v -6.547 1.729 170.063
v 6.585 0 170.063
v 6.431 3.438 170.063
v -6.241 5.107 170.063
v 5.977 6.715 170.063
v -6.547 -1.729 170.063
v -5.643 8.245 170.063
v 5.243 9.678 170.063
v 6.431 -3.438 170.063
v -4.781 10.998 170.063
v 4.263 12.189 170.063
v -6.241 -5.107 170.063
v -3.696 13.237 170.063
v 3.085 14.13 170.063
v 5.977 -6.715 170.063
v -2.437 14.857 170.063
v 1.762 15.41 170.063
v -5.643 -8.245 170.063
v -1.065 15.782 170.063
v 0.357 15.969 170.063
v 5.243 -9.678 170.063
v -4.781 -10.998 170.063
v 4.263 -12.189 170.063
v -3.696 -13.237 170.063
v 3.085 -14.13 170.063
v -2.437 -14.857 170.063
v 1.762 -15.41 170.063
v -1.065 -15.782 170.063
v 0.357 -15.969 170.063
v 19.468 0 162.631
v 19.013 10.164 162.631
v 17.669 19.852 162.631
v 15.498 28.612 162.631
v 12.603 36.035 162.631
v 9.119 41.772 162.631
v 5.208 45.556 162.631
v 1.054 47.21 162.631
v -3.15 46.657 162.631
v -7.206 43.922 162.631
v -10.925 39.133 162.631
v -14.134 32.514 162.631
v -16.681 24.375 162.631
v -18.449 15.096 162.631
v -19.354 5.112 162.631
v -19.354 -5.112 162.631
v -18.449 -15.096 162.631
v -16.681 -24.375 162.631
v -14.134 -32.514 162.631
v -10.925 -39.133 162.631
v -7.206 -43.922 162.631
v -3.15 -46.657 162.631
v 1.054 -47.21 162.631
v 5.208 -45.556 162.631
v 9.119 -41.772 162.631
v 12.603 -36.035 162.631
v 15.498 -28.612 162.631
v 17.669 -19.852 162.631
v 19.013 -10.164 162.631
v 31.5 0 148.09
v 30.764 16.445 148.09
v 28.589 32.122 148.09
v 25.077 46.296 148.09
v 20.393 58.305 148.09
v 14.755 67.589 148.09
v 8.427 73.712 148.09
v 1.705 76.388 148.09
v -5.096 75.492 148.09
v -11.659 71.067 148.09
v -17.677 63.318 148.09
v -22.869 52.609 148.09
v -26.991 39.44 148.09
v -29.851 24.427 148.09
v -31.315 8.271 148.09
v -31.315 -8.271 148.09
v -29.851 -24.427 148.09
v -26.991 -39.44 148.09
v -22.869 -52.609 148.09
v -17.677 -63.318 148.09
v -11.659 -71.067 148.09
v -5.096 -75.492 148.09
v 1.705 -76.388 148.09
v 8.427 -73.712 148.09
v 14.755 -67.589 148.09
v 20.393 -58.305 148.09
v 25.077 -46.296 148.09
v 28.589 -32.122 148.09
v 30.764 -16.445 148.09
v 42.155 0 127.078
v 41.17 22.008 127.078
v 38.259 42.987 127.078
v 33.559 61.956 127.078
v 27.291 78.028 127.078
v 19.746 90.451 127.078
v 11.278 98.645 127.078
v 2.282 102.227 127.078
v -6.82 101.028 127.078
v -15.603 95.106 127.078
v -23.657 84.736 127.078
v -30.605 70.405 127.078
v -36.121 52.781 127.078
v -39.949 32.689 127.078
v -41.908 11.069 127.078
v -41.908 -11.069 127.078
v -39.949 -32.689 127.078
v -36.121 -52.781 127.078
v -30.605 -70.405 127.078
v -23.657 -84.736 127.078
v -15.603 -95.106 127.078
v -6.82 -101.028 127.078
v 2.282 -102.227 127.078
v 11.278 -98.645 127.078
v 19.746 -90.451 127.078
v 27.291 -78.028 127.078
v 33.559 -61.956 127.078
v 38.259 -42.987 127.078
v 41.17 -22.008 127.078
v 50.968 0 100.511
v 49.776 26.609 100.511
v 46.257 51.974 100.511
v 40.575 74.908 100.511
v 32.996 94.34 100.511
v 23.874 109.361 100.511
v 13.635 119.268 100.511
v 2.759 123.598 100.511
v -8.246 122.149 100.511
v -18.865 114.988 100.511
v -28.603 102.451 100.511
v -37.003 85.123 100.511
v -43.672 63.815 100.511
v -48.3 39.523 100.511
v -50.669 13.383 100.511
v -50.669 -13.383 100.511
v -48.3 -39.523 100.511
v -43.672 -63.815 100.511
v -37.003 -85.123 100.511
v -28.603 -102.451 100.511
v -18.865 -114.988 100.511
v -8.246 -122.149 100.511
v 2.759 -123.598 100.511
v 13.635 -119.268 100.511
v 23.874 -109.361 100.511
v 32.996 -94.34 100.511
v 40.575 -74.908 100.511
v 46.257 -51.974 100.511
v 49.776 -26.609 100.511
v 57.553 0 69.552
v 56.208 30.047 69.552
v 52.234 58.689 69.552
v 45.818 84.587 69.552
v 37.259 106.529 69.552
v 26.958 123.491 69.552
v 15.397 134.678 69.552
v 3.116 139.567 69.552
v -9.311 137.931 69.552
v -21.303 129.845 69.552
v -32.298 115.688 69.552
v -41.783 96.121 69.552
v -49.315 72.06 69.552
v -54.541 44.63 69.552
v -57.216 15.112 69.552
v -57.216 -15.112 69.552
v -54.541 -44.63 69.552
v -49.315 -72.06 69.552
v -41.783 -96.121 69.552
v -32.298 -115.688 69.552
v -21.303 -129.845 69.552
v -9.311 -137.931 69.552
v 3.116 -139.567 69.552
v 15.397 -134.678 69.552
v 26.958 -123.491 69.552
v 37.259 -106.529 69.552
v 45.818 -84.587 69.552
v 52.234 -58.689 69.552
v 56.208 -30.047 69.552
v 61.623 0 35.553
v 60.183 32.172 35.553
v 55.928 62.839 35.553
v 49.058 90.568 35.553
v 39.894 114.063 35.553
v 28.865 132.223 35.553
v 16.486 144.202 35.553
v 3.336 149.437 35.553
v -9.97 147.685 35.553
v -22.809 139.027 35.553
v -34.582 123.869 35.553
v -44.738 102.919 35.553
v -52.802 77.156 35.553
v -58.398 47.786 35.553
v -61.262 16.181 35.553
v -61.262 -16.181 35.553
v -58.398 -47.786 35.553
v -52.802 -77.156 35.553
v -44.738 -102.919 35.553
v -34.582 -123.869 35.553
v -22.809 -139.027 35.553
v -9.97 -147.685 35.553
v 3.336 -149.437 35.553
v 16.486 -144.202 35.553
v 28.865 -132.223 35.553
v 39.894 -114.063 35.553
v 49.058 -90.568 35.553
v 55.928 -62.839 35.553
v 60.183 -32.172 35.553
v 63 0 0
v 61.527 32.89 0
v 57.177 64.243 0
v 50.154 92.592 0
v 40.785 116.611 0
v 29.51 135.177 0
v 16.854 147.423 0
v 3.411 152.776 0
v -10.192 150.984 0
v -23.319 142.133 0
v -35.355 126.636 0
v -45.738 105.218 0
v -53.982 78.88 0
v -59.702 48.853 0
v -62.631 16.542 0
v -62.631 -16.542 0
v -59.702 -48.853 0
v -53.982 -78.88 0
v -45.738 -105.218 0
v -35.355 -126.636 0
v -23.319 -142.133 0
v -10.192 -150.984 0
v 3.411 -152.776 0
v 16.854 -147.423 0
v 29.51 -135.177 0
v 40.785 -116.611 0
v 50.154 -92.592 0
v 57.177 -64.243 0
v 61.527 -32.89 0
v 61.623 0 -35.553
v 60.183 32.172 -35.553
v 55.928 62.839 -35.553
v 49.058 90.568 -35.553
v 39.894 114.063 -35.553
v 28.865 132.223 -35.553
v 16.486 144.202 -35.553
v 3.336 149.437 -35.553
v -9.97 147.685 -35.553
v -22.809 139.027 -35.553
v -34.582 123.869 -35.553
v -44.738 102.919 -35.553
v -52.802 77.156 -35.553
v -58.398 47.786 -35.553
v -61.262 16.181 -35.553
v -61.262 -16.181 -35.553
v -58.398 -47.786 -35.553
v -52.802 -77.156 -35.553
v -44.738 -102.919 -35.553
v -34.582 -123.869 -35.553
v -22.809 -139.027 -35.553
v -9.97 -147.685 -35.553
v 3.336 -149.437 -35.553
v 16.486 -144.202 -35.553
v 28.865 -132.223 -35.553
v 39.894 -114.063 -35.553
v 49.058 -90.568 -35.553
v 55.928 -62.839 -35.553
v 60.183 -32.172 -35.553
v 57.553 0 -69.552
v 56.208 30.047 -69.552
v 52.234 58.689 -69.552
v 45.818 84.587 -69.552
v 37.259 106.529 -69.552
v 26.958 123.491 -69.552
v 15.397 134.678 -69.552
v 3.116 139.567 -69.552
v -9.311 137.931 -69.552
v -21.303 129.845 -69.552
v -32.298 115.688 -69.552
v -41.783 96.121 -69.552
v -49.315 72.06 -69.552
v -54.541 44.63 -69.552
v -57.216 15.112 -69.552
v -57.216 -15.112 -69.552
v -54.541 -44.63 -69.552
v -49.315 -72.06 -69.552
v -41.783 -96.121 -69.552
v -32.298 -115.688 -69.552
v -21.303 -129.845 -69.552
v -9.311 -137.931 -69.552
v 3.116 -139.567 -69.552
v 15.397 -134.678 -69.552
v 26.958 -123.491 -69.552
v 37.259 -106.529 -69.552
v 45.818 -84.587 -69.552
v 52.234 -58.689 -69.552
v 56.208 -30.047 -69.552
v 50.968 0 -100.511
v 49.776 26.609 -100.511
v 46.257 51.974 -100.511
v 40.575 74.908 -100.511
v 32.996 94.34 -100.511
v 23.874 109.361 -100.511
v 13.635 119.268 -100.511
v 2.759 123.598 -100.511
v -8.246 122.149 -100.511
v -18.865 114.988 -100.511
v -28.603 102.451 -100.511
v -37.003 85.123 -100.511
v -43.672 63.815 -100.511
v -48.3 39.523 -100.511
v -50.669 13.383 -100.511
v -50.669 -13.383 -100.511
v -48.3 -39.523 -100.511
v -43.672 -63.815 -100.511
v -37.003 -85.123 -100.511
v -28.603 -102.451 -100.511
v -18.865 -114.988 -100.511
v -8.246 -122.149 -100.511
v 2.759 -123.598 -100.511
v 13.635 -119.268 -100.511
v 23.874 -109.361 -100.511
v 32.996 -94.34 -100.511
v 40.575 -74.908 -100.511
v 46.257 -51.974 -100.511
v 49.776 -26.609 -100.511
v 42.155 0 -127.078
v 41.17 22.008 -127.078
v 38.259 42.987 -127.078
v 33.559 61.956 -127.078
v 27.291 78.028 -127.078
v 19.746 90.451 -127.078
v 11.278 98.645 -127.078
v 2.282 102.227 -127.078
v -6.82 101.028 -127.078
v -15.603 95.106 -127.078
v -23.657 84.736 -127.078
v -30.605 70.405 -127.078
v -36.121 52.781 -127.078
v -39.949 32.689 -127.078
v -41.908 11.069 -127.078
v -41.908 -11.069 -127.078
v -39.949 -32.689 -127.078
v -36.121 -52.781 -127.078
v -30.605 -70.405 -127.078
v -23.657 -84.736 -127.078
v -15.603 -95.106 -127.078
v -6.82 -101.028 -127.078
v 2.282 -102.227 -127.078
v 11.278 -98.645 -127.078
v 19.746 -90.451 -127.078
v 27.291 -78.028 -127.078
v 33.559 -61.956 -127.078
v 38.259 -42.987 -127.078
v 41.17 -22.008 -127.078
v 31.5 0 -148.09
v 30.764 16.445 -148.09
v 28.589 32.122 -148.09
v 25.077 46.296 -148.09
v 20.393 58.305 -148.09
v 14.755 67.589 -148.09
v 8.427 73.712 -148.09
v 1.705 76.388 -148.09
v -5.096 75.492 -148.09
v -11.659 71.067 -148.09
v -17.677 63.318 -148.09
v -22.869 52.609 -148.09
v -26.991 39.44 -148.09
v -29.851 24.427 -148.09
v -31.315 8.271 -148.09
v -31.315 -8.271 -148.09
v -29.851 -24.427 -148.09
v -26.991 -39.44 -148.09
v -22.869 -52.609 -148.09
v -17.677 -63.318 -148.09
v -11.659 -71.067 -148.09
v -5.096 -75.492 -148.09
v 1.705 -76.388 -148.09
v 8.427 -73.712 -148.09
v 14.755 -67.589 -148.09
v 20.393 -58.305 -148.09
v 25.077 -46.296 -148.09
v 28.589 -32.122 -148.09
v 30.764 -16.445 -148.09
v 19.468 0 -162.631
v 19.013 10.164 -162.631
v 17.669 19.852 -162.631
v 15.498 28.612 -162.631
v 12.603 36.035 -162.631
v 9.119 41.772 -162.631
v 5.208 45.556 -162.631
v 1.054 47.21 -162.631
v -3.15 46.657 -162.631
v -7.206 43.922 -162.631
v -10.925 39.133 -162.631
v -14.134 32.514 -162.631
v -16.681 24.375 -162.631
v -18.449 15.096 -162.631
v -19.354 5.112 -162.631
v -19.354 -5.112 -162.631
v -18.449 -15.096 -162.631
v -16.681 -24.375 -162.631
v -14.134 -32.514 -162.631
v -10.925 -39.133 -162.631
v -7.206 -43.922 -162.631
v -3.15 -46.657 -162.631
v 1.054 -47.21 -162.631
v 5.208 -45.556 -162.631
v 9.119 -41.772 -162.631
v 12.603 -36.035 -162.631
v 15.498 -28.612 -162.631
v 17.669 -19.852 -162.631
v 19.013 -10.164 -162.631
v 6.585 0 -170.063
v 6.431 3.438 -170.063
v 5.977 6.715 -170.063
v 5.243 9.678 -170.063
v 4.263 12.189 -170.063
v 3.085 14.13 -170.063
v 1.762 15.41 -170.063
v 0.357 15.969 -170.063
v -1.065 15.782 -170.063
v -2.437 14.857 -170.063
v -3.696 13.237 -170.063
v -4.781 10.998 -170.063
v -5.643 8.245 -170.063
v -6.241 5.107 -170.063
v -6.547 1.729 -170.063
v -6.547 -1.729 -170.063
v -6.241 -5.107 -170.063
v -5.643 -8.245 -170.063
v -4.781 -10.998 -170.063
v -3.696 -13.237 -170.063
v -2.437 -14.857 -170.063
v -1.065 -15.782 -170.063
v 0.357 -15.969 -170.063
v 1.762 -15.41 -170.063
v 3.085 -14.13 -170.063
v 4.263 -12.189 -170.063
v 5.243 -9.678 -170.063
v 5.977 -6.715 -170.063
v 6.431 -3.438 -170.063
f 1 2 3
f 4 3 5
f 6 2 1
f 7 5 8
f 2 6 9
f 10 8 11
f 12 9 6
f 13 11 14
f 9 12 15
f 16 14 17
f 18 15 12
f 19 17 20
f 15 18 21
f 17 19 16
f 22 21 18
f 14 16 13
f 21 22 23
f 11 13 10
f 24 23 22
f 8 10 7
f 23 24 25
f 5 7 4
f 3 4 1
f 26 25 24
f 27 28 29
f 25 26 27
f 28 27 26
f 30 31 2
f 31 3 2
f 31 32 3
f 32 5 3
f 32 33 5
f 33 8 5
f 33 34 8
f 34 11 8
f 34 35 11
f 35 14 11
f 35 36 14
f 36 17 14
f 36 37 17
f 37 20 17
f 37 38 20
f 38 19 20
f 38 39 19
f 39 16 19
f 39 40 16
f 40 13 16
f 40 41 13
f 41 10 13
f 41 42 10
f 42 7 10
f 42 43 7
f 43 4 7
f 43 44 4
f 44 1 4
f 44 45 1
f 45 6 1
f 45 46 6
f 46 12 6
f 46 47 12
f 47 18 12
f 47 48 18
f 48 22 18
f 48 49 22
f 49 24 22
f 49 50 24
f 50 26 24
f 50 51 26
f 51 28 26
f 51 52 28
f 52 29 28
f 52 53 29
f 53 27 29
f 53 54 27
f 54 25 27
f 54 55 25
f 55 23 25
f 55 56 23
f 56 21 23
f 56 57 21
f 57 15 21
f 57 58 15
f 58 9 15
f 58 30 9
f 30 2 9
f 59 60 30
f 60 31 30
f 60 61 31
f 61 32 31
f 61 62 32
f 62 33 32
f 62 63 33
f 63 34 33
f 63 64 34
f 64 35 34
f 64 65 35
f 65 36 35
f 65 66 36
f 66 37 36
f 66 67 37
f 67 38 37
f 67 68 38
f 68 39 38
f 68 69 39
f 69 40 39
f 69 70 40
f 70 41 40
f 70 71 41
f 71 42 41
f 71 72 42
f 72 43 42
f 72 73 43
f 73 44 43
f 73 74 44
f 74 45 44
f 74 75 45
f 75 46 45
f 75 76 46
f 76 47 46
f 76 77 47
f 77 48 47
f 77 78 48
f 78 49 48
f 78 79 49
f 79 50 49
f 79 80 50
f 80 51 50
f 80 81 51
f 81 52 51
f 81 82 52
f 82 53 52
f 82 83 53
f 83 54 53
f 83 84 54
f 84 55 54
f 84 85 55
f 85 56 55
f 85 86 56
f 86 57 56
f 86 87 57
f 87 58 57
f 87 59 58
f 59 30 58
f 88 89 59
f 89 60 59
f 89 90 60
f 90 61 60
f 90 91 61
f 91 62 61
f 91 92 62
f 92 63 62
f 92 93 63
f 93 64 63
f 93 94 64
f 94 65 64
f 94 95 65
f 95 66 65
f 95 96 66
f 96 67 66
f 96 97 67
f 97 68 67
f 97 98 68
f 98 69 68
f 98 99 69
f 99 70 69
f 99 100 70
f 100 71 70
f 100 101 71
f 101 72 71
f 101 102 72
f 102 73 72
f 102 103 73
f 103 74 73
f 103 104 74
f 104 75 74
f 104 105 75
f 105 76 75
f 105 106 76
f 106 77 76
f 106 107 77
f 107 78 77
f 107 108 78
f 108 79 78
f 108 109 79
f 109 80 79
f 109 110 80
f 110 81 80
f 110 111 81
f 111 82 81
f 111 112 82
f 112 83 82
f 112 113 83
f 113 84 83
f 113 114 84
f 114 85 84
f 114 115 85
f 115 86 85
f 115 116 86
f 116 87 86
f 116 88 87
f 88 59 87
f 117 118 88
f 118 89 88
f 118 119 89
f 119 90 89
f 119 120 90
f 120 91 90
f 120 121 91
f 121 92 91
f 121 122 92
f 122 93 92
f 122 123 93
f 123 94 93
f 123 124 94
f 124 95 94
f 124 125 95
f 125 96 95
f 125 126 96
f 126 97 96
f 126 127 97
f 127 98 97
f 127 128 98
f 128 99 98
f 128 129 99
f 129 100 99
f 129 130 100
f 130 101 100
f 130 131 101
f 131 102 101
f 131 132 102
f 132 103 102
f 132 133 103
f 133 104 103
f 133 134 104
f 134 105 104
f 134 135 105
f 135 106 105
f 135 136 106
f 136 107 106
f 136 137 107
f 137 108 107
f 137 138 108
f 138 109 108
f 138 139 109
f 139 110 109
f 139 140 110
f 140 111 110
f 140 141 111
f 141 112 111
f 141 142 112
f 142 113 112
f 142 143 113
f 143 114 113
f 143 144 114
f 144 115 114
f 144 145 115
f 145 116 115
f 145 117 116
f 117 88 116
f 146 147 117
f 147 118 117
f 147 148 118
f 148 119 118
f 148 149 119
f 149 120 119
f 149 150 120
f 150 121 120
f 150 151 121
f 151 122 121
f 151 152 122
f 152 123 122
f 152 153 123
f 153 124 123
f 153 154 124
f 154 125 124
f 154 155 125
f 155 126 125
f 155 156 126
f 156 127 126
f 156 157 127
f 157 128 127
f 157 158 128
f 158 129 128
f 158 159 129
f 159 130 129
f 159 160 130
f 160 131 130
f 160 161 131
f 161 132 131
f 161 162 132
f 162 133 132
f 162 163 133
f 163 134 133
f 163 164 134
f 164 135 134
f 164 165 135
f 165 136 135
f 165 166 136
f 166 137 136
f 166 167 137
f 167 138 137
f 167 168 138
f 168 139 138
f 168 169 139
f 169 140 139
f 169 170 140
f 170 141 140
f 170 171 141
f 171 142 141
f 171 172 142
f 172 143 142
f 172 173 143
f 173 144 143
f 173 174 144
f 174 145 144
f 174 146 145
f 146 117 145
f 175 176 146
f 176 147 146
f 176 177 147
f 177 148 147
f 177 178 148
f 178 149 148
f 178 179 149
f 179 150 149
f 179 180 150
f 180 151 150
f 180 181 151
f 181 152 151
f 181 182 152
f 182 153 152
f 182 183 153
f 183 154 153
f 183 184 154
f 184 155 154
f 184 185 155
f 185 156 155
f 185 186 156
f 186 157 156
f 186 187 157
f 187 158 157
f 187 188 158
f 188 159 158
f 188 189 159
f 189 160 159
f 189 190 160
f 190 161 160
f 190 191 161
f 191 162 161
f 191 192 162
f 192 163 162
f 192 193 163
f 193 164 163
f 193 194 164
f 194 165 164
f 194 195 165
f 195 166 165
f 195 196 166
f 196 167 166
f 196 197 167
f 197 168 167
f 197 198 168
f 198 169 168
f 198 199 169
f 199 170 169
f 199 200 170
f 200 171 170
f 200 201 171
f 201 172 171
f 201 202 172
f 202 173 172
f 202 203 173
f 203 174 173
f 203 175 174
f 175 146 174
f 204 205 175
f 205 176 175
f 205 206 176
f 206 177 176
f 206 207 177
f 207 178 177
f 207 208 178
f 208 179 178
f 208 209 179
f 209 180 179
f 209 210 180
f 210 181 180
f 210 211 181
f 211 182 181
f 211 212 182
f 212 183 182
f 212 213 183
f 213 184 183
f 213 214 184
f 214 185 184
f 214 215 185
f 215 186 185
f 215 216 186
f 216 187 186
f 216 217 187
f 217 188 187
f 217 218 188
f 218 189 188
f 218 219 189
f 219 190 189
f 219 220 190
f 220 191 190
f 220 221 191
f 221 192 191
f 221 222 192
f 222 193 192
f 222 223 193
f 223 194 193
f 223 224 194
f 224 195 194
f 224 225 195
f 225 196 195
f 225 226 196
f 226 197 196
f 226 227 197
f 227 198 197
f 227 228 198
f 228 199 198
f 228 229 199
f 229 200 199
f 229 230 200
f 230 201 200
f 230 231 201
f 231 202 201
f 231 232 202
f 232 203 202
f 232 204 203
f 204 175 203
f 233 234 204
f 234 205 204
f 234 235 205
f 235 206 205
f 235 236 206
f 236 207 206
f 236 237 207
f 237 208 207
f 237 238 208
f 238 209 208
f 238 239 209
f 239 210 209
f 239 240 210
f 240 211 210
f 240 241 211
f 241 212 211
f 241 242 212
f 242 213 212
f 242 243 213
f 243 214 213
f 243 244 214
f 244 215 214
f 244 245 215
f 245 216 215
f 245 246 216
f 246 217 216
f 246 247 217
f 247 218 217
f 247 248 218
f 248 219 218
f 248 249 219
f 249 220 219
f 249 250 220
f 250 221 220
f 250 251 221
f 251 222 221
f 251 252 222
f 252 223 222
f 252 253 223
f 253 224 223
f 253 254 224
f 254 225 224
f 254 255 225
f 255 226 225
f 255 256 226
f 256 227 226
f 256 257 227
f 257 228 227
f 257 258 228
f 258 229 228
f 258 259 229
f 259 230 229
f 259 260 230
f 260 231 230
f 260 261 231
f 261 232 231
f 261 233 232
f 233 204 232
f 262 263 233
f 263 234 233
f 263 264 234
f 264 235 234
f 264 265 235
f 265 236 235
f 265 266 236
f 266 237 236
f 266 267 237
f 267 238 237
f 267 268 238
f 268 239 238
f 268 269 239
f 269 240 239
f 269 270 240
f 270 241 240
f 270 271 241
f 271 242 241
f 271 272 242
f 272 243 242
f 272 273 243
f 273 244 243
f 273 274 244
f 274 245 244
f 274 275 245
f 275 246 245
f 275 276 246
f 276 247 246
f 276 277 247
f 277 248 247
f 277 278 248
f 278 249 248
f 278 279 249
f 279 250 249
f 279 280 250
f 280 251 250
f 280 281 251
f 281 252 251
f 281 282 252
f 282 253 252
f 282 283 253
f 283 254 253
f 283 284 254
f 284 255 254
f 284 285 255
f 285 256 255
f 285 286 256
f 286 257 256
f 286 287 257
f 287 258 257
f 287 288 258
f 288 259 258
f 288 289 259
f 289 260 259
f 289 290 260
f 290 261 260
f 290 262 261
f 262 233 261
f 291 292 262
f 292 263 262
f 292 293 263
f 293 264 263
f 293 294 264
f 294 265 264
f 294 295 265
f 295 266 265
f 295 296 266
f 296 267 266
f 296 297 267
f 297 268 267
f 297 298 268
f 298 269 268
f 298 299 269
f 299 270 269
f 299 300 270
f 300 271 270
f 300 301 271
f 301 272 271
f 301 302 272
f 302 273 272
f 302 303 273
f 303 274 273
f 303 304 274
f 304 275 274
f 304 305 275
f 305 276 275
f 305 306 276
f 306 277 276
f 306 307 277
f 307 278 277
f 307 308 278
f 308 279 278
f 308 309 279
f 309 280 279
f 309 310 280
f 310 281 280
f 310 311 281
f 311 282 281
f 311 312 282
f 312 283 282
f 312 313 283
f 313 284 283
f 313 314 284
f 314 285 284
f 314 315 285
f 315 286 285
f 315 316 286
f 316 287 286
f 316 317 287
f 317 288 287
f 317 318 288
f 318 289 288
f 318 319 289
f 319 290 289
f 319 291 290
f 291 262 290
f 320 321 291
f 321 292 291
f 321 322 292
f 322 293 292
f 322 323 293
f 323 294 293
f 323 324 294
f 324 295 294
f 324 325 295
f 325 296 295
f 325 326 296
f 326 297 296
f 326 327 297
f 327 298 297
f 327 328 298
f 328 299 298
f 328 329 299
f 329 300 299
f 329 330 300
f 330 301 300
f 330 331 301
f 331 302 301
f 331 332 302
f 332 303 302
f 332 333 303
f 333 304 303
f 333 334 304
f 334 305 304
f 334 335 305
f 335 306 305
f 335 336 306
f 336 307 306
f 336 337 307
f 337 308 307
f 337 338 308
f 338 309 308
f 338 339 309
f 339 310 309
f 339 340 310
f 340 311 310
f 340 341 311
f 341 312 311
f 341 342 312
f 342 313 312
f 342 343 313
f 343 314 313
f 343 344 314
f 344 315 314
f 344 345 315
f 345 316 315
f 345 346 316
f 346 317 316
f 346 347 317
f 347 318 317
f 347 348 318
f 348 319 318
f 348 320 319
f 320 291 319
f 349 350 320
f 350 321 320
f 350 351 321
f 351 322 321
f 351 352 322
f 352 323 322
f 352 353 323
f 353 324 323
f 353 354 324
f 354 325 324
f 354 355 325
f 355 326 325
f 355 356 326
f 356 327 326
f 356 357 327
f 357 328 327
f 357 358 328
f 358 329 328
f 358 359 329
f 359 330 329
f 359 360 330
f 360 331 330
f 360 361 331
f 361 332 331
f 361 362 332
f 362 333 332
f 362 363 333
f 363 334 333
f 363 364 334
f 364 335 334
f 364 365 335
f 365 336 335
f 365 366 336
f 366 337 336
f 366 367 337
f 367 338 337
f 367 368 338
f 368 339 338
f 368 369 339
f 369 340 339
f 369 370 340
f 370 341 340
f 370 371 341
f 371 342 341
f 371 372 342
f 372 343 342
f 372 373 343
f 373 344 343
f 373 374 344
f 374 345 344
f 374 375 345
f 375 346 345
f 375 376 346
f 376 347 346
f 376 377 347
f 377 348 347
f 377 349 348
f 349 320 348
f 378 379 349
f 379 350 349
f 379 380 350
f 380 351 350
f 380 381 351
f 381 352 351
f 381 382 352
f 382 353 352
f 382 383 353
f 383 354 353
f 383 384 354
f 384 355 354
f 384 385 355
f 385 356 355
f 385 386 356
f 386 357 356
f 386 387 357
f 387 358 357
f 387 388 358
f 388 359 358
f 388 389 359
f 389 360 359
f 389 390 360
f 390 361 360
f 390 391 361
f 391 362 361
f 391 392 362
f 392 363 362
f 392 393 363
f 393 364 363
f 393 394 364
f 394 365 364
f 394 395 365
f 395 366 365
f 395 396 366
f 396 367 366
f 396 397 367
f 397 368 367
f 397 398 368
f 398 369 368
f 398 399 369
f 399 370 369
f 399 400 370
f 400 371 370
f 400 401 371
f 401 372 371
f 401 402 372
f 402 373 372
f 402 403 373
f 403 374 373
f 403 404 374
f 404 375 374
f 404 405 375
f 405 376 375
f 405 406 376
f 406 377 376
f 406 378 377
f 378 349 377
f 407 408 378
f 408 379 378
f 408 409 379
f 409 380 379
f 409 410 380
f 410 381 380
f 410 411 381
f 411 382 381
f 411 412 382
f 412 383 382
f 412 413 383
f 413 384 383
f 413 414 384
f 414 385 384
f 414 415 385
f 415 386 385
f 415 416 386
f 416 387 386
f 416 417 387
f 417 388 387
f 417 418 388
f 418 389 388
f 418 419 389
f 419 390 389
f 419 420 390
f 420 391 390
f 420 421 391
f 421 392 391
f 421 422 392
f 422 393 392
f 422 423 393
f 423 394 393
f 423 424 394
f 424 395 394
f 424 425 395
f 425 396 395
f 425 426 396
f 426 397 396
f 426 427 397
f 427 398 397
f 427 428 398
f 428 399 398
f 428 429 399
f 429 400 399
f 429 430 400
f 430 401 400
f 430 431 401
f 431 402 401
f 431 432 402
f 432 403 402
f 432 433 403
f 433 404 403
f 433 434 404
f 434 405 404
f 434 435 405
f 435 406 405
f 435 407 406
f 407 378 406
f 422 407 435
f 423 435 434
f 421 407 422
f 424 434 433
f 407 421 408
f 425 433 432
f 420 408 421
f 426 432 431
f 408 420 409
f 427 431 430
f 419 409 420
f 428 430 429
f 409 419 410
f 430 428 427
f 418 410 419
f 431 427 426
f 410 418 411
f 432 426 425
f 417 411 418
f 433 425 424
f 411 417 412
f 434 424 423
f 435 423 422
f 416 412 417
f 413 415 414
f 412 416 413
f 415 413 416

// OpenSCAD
// Generated by SolidPython 1.0.1 on 2020-07-29 00:46:48


scale(v = [7, 17, 19]) {
	sphere(r = 9);
}
/***********************************************
*********      SolidPython code:      **********
************************************************
 
# import packages: SolidPython
from solid import *
from solid.utils import *
from itertools import chain, combinations, permutations


class Resize:

    def __init__(self, scad_file):
        self.scad_file = scad_file
        #self.scad_file = import_scad(scad_file)
        # cone/cylinder param:
        self.r1 = 0
        self.r2 = 0
        self.h = 0
        # rectangular prism param:
        self.w = 0
        self.l = 0
        # ellipse param:
        self.r = 0

    # import OpenScad code (file name corresponds to shape)


    # classify shape + parameters
    def assign(self, param1, param2, param3):
        if self.scad_file == 'cone.scad':
            self.r1 = param1
            self.r2 = param2
            self.h = param3
        elif self.scad_file == 'cylinder.scad':
            self.r1 = param1
            self.r2 = param2
            self.h = param3
        elif self.scad_file == 'rectangularPrism.scad':
            self.h = param1
            self.l = param2
            self.w = param3
        else:
            self.r = param1
            self.h = param2

    # resize parameters
    def iterate(self):
        x = range(3, 20, 2)
        i = 1
        if self.scad_file == 'cone.scad':
            tempList = list(permutations(x, 2))
            for temp in tempList:
                param1 = temp[0]
                param2 = temp[1]
                filepath = 'produced_scad_files/' + 'cone' + str(param1) + '_' + str(param2) + '_' + '.scad'
                scad_render_to_file(cylinder(h=param1, r1=param2, r2=0), filepath)

        elif self.scad_file == 'cylinder.scad':
            tempList = list(permutations(x, 3))
            for temp in tempList:
                param1 = temp[0]
                param2 = temp[1]
                filepath = 'produced_scad_files/' + 'cylinder' + str(param1) + '_' + str(param2) + '_' + '.scad'
                scad_render_to_file(cylinder(h=param1, r1=param2, r2=param2), filepath)

        elif self.scad_file == 'rectangularPrism.scad':
            tempList = list(permutations(x, 3))
            for temp in tempList:
                param1 = temp[0]
                param2 = temp[1]
                param3 = temp[2]
                filepath = 'produced_scad_files/' + 'rectangularPrism' + str(param1) + '_' + str(param2) + '_' + str(
                    param3) + '.scad'
                scad_render_to_file(cube(size=(param1, param2, param3)), filepath)

        elif self.scad_file == 'ellipse.scad':
            tempList = list(permutations(x, 4))
            for temp in tempList:
                param1 = temp[0]
                param2 = temp[1]
                param3 = temp[2]
                param4 = temp[3]
                filepath = 'produced_scad_files/' + 'ellipse' + str(param1) + '_' + str(param2) + '_' + str(param3) + '_' + str(param4) + '.scad'
                scad_render_to_file(scale([param1, param2, param3])(sphere(r=param4)), filepath)

    def render_to_scadfile(self):
        scad_render_to_file(scad, 'example.scad') 
 
************************************************/
